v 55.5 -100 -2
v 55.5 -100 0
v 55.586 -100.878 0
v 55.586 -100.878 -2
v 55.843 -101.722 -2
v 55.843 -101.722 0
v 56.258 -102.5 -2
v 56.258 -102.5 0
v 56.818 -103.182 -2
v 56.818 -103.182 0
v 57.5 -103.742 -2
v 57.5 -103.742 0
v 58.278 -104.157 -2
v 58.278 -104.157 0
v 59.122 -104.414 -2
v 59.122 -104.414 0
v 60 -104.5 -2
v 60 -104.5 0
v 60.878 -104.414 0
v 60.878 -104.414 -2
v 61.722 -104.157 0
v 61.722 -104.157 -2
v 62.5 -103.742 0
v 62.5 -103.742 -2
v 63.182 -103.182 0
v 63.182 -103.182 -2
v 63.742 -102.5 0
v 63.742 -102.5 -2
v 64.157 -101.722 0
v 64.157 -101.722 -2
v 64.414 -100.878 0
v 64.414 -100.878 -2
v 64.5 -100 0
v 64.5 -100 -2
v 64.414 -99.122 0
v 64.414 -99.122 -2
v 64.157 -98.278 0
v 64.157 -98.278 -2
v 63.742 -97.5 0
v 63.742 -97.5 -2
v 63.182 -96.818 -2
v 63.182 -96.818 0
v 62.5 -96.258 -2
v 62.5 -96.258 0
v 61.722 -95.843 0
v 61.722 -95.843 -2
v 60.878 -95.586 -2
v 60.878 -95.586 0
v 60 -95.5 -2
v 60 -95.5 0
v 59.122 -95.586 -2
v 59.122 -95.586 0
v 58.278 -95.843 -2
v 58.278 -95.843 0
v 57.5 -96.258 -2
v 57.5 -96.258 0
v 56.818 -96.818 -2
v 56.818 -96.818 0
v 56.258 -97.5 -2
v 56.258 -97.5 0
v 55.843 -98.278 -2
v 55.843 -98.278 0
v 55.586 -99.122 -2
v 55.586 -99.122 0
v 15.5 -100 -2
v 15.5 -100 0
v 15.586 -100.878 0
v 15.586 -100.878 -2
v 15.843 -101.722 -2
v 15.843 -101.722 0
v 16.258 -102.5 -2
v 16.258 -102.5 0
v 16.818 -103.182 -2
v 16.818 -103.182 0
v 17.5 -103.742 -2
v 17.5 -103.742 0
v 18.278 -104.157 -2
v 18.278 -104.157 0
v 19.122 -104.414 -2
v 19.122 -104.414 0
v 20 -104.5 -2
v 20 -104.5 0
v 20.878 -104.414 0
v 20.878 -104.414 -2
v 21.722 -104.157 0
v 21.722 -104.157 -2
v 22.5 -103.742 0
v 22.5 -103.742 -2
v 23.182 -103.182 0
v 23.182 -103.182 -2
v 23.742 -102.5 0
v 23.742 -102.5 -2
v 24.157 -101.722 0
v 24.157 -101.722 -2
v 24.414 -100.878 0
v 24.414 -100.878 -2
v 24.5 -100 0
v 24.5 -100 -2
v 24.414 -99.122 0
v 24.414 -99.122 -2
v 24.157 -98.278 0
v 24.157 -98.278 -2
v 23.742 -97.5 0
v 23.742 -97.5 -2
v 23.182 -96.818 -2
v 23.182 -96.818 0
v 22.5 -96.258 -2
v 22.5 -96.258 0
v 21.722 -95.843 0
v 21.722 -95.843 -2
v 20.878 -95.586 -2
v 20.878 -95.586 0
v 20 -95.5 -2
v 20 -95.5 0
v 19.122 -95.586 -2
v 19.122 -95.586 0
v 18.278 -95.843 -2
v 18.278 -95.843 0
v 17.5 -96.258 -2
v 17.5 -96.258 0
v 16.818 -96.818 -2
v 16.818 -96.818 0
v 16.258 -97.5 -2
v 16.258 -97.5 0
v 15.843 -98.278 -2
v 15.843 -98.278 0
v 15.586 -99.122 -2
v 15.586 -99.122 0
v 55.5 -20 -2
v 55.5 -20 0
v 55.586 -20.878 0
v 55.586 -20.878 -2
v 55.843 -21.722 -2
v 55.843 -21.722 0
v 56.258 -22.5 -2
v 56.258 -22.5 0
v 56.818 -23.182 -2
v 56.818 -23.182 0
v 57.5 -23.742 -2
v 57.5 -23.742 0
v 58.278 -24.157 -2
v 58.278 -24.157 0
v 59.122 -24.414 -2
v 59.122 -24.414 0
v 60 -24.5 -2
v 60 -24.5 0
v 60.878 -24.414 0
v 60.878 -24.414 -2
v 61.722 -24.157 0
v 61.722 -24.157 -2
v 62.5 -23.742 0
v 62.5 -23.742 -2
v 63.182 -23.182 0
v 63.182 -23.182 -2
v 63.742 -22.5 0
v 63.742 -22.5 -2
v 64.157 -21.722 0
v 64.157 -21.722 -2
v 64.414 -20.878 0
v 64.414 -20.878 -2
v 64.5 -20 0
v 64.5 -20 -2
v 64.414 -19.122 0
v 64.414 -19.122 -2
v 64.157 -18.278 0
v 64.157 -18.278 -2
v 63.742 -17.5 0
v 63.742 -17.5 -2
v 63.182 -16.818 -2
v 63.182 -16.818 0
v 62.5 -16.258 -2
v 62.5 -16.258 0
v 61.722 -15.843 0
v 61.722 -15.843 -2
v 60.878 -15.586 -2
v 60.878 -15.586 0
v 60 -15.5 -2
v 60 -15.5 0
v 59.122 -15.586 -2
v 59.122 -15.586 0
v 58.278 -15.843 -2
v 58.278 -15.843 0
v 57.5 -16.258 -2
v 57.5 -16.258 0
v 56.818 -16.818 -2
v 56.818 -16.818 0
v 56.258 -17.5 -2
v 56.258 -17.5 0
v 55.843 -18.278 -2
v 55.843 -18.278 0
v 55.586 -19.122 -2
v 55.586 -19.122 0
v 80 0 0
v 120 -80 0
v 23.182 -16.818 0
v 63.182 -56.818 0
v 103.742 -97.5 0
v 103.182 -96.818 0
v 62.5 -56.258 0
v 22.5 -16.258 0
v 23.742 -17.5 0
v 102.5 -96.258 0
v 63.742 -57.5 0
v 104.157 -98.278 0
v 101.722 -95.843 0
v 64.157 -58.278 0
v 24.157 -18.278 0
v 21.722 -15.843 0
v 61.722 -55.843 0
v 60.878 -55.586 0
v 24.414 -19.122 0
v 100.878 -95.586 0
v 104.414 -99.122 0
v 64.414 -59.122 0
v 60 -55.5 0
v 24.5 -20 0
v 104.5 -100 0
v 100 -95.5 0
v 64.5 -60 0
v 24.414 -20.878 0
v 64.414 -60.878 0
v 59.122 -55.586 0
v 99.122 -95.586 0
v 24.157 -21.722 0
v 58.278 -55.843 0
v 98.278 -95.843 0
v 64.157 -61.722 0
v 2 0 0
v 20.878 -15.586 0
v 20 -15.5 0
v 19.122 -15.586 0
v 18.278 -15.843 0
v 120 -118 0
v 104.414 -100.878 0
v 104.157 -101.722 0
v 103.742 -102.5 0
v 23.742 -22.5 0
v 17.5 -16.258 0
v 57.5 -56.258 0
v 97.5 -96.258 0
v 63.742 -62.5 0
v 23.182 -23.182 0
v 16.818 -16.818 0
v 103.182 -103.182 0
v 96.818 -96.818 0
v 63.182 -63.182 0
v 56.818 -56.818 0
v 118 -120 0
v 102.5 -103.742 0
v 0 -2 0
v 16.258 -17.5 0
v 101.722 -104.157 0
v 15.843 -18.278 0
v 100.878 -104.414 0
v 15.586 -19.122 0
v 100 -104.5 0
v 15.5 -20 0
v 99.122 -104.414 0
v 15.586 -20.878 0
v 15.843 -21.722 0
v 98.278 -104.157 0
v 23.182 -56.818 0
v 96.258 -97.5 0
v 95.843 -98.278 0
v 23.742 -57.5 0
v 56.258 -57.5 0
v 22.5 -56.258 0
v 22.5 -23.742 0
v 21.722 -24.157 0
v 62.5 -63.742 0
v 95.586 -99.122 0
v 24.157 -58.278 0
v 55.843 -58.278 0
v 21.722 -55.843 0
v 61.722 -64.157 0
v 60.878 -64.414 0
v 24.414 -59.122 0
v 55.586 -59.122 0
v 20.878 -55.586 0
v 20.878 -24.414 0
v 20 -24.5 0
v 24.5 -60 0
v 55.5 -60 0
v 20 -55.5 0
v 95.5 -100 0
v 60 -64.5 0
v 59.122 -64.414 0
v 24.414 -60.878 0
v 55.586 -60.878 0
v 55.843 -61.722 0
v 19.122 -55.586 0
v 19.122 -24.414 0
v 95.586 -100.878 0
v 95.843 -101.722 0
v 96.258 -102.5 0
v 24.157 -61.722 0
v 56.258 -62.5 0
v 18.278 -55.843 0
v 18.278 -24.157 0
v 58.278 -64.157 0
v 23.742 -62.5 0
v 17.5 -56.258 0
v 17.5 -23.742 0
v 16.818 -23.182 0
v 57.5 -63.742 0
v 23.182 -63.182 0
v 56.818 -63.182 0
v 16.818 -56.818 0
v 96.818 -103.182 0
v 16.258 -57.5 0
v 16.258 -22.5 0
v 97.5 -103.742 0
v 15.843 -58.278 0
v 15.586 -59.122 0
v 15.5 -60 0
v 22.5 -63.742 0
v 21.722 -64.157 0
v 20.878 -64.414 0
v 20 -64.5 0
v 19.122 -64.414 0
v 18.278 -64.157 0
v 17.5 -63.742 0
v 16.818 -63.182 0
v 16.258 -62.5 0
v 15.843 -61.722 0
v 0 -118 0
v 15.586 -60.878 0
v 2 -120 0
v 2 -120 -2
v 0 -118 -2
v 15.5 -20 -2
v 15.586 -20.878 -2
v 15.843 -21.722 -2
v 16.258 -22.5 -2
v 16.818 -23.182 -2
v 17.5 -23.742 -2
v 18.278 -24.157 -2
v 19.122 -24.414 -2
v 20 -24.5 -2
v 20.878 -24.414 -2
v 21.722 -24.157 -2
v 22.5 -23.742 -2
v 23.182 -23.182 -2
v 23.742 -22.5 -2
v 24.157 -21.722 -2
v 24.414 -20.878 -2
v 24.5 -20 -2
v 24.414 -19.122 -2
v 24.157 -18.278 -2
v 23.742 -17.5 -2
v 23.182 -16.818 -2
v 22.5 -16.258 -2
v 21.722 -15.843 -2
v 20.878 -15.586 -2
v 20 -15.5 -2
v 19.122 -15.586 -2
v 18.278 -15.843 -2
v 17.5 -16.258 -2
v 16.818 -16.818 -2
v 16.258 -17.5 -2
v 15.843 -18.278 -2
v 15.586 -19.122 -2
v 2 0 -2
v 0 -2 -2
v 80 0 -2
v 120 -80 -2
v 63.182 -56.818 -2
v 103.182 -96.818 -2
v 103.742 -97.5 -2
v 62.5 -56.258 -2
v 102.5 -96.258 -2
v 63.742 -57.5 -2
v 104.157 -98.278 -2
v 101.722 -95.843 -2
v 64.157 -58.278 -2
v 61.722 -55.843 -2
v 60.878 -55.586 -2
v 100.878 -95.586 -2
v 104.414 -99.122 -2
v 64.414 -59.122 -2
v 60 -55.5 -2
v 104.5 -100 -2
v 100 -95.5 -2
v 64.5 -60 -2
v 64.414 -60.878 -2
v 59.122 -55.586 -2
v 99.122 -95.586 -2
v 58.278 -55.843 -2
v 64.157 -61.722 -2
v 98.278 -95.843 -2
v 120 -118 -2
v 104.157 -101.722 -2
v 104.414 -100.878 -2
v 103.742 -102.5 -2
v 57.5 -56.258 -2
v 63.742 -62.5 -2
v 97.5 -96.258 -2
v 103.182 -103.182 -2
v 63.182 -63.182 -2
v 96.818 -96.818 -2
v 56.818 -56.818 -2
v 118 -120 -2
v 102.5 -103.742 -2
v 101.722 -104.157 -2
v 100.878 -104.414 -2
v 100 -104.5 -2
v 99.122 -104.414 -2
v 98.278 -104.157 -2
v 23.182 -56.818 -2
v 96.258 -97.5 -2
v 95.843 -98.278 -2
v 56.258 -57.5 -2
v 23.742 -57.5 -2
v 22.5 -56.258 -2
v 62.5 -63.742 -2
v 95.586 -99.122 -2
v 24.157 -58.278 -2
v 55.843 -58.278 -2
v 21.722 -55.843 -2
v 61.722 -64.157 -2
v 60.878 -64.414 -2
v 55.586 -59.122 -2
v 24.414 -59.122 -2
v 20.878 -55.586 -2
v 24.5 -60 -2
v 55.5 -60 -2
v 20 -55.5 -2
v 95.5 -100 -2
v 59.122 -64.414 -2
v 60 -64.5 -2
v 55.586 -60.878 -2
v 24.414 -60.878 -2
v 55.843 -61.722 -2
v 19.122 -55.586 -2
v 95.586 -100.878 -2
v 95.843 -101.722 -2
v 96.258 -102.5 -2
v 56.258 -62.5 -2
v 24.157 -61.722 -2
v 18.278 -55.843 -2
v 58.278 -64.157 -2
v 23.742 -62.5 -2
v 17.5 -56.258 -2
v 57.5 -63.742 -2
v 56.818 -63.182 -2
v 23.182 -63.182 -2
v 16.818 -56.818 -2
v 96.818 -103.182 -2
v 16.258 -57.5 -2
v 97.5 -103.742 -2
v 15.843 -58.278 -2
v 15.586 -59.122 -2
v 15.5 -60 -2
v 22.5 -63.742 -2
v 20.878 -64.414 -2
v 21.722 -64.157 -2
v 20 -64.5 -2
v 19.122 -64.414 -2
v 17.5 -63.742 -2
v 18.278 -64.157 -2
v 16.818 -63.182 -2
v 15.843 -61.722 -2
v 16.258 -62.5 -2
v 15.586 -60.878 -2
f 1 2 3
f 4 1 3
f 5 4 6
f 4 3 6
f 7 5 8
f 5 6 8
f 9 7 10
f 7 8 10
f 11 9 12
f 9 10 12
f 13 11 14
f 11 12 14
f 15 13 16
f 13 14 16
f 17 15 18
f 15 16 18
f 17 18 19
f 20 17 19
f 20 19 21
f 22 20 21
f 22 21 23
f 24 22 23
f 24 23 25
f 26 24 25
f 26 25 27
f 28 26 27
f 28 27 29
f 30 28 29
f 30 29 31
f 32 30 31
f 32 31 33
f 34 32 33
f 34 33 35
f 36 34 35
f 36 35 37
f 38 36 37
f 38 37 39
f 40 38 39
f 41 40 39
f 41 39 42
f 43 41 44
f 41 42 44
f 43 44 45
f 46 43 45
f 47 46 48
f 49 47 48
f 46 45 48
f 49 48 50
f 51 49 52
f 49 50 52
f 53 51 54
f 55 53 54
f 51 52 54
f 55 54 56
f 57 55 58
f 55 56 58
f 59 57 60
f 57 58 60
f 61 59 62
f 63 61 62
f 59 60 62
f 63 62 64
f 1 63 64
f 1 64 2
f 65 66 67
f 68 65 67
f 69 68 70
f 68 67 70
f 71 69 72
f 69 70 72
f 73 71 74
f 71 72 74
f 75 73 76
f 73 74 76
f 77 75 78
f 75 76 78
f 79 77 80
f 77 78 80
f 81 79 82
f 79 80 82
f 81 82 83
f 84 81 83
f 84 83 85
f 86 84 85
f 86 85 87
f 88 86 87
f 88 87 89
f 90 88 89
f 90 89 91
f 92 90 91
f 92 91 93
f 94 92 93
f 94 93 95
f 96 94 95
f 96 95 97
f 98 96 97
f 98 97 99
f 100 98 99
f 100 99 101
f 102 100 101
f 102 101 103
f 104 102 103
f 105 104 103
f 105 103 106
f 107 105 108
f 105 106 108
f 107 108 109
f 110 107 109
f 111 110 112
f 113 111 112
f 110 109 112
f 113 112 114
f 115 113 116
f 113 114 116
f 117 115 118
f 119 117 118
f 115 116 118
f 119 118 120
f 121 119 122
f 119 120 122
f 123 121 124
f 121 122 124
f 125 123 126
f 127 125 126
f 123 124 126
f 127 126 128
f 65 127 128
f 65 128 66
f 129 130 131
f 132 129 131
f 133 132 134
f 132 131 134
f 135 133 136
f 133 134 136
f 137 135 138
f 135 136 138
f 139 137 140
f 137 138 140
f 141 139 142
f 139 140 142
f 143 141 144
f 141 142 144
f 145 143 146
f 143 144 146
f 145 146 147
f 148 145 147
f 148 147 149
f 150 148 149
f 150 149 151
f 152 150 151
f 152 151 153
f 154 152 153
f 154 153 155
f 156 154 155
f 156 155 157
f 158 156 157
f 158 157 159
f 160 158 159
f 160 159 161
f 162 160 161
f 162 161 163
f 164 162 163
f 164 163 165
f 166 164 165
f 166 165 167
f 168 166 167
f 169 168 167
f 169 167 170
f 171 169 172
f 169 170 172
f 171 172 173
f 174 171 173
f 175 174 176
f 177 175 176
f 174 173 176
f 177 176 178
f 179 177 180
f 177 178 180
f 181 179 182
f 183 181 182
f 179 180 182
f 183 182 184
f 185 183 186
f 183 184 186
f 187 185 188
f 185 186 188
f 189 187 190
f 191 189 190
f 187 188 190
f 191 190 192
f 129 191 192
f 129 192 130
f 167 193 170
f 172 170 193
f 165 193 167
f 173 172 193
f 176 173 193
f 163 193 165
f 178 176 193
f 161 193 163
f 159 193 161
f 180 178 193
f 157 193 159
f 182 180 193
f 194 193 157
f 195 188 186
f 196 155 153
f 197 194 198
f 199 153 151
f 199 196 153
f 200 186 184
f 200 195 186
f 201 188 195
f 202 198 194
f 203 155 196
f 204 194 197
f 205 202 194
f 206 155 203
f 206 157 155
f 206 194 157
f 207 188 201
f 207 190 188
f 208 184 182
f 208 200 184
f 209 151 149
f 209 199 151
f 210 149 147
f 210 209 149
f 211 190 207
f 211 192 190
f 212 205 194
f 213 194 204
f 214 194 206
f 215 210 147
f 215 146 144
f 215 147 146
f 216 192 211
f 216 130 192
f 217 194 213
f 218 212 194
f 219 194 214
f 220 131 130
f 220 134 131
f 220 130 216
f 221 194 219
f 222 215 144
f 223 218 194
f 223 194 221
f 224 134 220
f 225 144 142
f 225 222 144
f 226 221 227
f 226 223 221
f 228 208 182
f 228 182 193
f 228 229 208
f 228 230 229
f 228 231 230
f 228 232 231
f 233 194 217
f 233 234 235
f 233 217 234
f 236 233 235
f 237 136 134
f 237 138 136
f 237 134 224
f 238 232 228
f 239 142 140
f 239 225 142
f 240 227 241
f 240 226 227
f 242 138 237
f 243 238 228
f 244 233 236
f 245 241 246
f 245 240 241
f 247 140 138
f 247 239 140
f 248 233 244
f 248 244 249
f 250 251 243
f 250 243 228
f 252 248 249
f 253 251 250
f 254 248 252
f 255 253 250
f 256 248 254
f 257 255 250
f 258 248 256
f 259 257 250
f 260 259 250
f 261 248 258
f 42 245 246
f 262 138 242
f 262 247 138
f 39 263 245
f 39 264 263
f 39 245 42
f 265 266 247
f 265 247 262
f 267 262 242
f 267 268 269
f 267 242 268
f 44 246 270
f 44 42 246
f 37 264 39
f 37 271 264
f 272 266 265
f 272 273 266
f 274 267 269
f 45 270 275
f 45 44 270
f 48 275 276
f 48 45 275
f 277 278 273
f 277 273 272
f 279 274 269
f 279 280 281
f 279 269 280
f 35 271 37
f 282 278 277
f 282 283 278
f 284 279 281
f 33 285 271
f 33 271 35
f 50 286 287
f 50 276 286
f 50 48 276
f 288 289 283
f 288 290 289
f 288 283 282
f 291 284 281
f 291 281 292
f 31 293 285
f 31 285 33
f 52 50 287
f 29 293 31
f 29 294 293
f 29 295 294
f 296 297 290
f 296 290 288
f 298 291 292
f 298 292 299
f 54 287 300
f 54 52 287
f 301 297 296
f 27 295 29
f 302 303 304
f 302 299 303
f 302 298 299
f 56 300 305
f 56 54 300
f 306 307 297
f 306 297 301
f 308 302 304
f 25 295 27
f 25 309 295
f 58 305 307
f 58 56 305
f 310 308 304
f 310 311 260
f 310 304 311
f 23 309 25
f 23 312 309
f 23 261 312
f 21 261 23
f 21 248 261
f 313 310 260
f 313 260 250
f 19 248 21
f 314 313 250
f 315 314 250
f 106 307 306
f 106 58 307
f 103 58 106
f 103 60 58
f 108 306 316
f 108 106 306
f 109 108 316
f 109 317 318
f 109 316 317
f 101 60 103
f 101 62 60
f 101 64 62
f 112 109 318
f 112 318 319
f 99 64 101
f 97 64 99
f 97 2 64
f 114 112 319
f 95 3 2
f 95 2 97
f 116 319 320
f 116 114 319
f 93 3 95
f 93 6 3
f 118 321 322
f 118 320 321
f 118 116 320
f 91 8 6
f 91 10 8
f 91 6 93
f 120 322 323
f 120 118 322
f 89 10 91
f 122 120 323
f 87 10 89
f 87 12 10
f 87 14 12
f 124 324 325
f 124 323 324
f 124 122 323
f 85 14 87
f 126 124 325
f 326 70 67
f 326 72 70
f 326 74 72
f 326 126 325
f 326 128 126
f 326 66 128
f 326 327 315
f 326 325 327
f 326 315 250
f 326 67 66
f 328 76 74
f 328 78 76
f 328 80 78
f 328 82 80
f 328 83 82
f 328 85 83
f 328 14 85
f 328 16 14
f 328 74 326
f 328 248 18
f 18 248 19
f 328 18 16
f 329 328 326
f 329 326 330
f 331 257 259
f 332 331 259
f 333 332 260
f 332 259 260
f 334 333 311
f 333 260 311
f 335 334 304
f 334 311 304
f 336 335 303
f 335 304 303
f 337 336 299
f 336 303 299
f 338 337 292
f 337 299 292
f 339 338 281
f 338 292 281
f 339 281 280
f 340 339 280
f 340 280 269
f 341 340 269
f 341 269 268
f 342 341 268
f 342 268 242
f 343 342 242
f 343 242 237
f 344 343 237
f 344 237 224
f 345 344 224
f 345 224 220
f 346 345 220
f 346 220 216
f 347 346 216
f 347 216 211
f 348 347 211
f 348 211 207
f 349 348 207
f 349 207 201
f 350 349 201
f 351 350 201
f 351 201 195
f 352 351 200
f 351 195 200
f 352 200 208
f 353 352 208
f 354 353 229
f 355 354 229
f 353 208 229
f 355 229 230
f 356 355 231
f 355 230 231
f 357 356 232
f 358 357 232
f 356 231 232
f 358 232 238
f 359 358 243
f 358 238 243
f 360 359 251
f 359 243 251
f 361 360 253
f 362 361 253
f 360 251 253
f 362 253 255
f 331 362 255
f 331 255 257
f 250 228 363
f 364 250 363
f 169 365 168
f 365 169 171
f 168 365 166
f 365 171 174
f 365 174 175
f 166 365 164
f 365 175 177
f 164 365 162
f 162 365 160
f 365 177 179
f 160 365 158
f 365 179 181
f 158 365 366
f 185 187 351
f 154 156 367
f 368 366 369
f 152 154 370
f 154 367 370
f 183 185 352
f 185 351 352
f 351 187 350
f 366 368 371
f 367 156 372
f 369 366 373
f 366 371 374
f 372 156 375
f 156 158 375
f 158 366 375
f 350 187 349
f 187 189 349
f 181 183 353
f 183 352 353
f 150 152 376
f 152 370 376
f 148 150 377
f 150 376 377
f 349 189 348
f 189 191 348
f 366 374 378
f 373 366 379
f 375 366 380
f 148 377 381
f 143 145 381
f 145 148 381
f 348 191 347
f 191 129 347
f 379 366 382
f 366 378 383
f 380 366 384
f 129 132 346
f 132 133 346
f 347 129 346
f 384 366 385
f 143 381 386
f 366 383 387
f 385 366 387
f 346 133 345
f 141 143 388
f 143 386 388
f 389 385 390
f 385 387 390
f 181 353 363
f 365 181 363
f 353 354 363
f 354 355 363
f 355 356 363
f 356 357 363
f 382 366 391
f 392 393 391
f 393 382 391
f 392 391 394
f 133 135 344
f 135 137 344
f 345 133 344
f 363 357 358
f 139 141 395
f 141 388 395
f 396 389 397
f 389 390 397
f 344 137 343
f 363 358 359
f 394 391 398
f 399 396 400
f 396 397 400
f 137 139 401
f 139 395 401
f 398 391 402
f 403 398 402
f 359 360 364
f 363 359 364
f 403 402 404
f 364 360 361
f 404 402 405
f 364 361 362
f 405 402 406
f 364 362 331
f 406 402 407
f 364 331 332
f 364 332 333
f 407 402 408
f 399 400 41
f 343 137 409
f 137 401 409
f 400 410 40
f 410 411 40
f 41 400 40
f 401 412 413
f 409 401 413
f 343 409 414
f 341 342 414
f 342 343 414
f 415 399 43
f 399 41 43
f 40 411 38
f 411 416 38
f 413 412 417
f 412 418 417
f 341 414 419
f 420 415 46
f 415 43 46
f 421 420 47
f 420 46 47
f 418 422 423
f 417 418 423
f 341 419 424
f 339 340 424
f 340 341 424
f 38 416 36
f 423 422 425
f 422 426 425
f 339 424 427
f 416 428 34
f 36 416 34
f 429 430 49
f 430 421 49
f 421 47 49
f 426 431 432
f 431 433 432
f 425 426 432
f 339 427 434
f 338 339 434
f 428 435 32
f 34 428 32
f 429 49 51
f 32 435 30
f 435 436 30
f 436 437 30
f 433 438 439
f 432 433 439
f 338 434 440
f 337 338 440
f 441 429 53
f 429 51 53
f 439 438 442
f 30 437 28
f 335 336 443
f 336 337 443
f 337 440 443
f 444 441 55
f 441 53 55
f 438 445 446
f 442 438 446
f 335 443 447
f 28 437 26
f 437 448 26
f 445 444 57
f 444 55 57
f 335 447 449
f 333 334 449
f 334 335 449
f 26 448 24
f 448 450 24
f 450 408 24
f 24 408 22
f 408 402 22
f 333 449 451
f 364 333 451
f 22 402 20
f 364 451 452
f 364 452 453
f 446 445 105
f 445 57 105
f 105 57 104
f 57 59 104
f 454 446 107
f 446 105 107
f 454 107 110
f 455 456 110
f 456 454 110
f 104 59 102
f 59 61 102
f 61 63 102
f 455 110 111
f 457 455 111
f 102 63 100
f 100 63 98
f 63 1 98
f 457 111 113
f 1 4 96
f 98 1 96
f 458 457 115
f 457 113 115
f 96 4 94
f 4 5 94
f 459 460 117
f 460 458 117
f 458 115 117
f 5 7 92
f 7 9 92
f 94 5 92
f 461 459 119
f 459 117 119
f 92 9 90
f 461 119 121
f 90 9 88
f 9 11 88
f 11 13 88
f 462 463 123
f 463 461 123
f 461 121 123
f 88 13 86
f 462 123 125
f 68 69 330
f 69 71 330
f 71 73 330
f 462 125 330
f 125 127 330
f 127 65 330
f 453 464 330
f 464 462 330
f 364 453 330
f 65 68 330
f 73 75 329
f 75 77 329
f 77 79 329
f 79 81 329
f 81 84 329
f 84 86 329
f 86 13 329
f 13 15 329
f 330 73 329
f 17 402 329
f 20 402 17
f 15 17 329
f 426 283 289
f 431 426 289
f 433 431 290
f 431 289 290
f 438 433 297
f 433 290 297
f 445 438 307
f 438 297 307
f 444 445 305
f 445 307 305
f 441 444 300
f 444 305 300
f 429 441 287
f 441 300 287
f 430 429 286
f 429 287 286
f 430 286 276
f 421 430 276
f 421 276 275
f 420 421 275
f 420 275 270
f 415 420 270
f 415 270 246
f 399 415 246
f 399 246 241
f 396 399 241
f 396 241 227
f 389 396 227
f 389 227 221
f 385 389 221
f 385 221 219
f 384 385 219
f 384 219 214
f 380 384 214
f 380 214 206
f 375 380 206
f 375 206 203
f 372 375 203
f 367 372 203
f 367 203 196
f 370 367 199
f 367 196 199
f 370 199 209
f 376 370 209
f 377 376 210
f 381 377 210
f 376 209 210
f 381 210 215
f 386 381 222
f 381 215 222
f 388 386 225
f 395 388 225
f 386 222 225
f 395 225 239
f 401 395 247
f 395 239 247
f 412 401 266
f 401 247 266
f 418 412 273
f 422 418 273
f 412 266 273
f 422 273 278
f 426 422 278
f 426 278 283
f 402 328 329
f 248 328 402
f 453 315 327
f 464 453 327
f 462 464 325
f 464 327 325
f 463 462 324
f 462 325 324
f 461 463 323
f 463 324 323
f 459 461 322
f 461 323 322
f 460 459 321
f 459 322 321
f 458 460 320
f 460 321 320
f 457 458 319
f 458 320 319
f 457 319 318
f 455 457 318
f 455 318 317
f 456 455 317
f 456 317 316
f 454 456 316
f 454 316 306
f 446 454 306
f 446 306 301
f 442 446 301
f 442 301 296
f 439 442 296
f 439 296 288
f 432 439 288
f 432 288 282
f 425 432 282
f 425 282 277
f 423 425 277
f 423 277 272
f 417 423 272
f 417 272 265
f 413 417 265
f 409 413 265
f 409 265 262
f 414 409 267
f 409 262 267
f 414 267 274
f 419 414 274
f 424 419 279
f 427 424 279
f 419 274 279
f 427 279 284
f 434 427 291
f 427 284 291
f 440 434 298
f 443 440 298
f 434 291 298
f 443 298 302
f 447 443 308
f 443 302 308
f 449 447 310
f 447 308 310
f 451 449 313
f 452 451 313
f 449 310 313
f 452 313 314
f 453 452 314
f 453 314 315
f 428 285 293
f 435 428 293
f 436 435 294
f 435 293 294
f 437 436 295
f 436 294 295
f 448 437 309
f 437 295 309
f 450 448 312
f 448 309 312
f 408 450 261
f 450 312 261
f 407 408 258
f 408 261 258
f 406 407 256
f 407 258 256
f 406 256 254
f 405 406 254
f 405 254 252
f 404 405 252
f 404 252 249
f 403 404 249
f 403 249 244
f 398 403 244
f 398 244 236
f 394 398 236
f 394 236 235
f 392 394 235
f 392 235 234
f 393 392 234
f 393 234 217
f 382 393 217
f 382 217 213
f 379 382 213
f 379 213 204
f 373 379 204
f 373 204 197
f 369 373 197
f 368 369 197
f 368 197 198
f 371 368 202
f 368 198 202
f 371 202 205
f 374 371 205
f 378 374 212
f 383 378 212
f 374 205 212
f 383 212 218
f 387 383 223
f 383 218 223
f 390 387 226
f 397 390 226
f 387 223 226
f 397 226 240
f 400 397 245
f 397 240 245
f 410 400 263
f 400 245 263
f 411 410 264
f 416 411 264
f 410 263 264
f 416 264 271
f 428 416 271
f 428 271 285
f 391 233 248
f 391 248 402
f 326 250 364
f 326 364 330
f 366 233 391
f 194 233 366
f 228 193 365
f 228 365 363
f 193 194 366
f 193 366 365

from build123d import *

# Parameters (mm, degrees)
EXTRUDE_1_DEPTH   = 2
HOLE_WIZARD_M81_D = 9
CHAMFER_1_SIZE    = 2


with BuildPart() as part:
    # Эскиз1 → Бобышка-Вытянуть1 (new body)
    with BuildSketch(Plane(origin=(0, 0, 0), x_dir=(1, 0, 0), z_dir=(0, 0, -1))):
        Polygon((0, 0), (0, 120), (120, 120), (120, 80), (80, 0), align=None)
    extrude(amount=EXTRUDE_1_DEPTH)

    # Отверстие с зазором M81 (through all)
    with Locations(Plane(origin=(0, 0, -2), x_dir=(1, 0, 0), z_dir=(0, 0, -1))):
        with Locations((60, 100), (20, 100), (20, 60), (20, 20), (100, 100), (60, 60), (60, 20)):
            Hole(HOLE_WIZARD_M81_D / 2)

    # Фаска1
    chamfer_1_edges = [part.edges().sort_by_distance(p)[0] for p in [
        (0, 0, -1),
        (0, -120, -1),
        (120, -120, -1),
    ]]
    chamfer(chamfer_1_edges, length=CHAMFER_1_SIZE)


solid = part.part
